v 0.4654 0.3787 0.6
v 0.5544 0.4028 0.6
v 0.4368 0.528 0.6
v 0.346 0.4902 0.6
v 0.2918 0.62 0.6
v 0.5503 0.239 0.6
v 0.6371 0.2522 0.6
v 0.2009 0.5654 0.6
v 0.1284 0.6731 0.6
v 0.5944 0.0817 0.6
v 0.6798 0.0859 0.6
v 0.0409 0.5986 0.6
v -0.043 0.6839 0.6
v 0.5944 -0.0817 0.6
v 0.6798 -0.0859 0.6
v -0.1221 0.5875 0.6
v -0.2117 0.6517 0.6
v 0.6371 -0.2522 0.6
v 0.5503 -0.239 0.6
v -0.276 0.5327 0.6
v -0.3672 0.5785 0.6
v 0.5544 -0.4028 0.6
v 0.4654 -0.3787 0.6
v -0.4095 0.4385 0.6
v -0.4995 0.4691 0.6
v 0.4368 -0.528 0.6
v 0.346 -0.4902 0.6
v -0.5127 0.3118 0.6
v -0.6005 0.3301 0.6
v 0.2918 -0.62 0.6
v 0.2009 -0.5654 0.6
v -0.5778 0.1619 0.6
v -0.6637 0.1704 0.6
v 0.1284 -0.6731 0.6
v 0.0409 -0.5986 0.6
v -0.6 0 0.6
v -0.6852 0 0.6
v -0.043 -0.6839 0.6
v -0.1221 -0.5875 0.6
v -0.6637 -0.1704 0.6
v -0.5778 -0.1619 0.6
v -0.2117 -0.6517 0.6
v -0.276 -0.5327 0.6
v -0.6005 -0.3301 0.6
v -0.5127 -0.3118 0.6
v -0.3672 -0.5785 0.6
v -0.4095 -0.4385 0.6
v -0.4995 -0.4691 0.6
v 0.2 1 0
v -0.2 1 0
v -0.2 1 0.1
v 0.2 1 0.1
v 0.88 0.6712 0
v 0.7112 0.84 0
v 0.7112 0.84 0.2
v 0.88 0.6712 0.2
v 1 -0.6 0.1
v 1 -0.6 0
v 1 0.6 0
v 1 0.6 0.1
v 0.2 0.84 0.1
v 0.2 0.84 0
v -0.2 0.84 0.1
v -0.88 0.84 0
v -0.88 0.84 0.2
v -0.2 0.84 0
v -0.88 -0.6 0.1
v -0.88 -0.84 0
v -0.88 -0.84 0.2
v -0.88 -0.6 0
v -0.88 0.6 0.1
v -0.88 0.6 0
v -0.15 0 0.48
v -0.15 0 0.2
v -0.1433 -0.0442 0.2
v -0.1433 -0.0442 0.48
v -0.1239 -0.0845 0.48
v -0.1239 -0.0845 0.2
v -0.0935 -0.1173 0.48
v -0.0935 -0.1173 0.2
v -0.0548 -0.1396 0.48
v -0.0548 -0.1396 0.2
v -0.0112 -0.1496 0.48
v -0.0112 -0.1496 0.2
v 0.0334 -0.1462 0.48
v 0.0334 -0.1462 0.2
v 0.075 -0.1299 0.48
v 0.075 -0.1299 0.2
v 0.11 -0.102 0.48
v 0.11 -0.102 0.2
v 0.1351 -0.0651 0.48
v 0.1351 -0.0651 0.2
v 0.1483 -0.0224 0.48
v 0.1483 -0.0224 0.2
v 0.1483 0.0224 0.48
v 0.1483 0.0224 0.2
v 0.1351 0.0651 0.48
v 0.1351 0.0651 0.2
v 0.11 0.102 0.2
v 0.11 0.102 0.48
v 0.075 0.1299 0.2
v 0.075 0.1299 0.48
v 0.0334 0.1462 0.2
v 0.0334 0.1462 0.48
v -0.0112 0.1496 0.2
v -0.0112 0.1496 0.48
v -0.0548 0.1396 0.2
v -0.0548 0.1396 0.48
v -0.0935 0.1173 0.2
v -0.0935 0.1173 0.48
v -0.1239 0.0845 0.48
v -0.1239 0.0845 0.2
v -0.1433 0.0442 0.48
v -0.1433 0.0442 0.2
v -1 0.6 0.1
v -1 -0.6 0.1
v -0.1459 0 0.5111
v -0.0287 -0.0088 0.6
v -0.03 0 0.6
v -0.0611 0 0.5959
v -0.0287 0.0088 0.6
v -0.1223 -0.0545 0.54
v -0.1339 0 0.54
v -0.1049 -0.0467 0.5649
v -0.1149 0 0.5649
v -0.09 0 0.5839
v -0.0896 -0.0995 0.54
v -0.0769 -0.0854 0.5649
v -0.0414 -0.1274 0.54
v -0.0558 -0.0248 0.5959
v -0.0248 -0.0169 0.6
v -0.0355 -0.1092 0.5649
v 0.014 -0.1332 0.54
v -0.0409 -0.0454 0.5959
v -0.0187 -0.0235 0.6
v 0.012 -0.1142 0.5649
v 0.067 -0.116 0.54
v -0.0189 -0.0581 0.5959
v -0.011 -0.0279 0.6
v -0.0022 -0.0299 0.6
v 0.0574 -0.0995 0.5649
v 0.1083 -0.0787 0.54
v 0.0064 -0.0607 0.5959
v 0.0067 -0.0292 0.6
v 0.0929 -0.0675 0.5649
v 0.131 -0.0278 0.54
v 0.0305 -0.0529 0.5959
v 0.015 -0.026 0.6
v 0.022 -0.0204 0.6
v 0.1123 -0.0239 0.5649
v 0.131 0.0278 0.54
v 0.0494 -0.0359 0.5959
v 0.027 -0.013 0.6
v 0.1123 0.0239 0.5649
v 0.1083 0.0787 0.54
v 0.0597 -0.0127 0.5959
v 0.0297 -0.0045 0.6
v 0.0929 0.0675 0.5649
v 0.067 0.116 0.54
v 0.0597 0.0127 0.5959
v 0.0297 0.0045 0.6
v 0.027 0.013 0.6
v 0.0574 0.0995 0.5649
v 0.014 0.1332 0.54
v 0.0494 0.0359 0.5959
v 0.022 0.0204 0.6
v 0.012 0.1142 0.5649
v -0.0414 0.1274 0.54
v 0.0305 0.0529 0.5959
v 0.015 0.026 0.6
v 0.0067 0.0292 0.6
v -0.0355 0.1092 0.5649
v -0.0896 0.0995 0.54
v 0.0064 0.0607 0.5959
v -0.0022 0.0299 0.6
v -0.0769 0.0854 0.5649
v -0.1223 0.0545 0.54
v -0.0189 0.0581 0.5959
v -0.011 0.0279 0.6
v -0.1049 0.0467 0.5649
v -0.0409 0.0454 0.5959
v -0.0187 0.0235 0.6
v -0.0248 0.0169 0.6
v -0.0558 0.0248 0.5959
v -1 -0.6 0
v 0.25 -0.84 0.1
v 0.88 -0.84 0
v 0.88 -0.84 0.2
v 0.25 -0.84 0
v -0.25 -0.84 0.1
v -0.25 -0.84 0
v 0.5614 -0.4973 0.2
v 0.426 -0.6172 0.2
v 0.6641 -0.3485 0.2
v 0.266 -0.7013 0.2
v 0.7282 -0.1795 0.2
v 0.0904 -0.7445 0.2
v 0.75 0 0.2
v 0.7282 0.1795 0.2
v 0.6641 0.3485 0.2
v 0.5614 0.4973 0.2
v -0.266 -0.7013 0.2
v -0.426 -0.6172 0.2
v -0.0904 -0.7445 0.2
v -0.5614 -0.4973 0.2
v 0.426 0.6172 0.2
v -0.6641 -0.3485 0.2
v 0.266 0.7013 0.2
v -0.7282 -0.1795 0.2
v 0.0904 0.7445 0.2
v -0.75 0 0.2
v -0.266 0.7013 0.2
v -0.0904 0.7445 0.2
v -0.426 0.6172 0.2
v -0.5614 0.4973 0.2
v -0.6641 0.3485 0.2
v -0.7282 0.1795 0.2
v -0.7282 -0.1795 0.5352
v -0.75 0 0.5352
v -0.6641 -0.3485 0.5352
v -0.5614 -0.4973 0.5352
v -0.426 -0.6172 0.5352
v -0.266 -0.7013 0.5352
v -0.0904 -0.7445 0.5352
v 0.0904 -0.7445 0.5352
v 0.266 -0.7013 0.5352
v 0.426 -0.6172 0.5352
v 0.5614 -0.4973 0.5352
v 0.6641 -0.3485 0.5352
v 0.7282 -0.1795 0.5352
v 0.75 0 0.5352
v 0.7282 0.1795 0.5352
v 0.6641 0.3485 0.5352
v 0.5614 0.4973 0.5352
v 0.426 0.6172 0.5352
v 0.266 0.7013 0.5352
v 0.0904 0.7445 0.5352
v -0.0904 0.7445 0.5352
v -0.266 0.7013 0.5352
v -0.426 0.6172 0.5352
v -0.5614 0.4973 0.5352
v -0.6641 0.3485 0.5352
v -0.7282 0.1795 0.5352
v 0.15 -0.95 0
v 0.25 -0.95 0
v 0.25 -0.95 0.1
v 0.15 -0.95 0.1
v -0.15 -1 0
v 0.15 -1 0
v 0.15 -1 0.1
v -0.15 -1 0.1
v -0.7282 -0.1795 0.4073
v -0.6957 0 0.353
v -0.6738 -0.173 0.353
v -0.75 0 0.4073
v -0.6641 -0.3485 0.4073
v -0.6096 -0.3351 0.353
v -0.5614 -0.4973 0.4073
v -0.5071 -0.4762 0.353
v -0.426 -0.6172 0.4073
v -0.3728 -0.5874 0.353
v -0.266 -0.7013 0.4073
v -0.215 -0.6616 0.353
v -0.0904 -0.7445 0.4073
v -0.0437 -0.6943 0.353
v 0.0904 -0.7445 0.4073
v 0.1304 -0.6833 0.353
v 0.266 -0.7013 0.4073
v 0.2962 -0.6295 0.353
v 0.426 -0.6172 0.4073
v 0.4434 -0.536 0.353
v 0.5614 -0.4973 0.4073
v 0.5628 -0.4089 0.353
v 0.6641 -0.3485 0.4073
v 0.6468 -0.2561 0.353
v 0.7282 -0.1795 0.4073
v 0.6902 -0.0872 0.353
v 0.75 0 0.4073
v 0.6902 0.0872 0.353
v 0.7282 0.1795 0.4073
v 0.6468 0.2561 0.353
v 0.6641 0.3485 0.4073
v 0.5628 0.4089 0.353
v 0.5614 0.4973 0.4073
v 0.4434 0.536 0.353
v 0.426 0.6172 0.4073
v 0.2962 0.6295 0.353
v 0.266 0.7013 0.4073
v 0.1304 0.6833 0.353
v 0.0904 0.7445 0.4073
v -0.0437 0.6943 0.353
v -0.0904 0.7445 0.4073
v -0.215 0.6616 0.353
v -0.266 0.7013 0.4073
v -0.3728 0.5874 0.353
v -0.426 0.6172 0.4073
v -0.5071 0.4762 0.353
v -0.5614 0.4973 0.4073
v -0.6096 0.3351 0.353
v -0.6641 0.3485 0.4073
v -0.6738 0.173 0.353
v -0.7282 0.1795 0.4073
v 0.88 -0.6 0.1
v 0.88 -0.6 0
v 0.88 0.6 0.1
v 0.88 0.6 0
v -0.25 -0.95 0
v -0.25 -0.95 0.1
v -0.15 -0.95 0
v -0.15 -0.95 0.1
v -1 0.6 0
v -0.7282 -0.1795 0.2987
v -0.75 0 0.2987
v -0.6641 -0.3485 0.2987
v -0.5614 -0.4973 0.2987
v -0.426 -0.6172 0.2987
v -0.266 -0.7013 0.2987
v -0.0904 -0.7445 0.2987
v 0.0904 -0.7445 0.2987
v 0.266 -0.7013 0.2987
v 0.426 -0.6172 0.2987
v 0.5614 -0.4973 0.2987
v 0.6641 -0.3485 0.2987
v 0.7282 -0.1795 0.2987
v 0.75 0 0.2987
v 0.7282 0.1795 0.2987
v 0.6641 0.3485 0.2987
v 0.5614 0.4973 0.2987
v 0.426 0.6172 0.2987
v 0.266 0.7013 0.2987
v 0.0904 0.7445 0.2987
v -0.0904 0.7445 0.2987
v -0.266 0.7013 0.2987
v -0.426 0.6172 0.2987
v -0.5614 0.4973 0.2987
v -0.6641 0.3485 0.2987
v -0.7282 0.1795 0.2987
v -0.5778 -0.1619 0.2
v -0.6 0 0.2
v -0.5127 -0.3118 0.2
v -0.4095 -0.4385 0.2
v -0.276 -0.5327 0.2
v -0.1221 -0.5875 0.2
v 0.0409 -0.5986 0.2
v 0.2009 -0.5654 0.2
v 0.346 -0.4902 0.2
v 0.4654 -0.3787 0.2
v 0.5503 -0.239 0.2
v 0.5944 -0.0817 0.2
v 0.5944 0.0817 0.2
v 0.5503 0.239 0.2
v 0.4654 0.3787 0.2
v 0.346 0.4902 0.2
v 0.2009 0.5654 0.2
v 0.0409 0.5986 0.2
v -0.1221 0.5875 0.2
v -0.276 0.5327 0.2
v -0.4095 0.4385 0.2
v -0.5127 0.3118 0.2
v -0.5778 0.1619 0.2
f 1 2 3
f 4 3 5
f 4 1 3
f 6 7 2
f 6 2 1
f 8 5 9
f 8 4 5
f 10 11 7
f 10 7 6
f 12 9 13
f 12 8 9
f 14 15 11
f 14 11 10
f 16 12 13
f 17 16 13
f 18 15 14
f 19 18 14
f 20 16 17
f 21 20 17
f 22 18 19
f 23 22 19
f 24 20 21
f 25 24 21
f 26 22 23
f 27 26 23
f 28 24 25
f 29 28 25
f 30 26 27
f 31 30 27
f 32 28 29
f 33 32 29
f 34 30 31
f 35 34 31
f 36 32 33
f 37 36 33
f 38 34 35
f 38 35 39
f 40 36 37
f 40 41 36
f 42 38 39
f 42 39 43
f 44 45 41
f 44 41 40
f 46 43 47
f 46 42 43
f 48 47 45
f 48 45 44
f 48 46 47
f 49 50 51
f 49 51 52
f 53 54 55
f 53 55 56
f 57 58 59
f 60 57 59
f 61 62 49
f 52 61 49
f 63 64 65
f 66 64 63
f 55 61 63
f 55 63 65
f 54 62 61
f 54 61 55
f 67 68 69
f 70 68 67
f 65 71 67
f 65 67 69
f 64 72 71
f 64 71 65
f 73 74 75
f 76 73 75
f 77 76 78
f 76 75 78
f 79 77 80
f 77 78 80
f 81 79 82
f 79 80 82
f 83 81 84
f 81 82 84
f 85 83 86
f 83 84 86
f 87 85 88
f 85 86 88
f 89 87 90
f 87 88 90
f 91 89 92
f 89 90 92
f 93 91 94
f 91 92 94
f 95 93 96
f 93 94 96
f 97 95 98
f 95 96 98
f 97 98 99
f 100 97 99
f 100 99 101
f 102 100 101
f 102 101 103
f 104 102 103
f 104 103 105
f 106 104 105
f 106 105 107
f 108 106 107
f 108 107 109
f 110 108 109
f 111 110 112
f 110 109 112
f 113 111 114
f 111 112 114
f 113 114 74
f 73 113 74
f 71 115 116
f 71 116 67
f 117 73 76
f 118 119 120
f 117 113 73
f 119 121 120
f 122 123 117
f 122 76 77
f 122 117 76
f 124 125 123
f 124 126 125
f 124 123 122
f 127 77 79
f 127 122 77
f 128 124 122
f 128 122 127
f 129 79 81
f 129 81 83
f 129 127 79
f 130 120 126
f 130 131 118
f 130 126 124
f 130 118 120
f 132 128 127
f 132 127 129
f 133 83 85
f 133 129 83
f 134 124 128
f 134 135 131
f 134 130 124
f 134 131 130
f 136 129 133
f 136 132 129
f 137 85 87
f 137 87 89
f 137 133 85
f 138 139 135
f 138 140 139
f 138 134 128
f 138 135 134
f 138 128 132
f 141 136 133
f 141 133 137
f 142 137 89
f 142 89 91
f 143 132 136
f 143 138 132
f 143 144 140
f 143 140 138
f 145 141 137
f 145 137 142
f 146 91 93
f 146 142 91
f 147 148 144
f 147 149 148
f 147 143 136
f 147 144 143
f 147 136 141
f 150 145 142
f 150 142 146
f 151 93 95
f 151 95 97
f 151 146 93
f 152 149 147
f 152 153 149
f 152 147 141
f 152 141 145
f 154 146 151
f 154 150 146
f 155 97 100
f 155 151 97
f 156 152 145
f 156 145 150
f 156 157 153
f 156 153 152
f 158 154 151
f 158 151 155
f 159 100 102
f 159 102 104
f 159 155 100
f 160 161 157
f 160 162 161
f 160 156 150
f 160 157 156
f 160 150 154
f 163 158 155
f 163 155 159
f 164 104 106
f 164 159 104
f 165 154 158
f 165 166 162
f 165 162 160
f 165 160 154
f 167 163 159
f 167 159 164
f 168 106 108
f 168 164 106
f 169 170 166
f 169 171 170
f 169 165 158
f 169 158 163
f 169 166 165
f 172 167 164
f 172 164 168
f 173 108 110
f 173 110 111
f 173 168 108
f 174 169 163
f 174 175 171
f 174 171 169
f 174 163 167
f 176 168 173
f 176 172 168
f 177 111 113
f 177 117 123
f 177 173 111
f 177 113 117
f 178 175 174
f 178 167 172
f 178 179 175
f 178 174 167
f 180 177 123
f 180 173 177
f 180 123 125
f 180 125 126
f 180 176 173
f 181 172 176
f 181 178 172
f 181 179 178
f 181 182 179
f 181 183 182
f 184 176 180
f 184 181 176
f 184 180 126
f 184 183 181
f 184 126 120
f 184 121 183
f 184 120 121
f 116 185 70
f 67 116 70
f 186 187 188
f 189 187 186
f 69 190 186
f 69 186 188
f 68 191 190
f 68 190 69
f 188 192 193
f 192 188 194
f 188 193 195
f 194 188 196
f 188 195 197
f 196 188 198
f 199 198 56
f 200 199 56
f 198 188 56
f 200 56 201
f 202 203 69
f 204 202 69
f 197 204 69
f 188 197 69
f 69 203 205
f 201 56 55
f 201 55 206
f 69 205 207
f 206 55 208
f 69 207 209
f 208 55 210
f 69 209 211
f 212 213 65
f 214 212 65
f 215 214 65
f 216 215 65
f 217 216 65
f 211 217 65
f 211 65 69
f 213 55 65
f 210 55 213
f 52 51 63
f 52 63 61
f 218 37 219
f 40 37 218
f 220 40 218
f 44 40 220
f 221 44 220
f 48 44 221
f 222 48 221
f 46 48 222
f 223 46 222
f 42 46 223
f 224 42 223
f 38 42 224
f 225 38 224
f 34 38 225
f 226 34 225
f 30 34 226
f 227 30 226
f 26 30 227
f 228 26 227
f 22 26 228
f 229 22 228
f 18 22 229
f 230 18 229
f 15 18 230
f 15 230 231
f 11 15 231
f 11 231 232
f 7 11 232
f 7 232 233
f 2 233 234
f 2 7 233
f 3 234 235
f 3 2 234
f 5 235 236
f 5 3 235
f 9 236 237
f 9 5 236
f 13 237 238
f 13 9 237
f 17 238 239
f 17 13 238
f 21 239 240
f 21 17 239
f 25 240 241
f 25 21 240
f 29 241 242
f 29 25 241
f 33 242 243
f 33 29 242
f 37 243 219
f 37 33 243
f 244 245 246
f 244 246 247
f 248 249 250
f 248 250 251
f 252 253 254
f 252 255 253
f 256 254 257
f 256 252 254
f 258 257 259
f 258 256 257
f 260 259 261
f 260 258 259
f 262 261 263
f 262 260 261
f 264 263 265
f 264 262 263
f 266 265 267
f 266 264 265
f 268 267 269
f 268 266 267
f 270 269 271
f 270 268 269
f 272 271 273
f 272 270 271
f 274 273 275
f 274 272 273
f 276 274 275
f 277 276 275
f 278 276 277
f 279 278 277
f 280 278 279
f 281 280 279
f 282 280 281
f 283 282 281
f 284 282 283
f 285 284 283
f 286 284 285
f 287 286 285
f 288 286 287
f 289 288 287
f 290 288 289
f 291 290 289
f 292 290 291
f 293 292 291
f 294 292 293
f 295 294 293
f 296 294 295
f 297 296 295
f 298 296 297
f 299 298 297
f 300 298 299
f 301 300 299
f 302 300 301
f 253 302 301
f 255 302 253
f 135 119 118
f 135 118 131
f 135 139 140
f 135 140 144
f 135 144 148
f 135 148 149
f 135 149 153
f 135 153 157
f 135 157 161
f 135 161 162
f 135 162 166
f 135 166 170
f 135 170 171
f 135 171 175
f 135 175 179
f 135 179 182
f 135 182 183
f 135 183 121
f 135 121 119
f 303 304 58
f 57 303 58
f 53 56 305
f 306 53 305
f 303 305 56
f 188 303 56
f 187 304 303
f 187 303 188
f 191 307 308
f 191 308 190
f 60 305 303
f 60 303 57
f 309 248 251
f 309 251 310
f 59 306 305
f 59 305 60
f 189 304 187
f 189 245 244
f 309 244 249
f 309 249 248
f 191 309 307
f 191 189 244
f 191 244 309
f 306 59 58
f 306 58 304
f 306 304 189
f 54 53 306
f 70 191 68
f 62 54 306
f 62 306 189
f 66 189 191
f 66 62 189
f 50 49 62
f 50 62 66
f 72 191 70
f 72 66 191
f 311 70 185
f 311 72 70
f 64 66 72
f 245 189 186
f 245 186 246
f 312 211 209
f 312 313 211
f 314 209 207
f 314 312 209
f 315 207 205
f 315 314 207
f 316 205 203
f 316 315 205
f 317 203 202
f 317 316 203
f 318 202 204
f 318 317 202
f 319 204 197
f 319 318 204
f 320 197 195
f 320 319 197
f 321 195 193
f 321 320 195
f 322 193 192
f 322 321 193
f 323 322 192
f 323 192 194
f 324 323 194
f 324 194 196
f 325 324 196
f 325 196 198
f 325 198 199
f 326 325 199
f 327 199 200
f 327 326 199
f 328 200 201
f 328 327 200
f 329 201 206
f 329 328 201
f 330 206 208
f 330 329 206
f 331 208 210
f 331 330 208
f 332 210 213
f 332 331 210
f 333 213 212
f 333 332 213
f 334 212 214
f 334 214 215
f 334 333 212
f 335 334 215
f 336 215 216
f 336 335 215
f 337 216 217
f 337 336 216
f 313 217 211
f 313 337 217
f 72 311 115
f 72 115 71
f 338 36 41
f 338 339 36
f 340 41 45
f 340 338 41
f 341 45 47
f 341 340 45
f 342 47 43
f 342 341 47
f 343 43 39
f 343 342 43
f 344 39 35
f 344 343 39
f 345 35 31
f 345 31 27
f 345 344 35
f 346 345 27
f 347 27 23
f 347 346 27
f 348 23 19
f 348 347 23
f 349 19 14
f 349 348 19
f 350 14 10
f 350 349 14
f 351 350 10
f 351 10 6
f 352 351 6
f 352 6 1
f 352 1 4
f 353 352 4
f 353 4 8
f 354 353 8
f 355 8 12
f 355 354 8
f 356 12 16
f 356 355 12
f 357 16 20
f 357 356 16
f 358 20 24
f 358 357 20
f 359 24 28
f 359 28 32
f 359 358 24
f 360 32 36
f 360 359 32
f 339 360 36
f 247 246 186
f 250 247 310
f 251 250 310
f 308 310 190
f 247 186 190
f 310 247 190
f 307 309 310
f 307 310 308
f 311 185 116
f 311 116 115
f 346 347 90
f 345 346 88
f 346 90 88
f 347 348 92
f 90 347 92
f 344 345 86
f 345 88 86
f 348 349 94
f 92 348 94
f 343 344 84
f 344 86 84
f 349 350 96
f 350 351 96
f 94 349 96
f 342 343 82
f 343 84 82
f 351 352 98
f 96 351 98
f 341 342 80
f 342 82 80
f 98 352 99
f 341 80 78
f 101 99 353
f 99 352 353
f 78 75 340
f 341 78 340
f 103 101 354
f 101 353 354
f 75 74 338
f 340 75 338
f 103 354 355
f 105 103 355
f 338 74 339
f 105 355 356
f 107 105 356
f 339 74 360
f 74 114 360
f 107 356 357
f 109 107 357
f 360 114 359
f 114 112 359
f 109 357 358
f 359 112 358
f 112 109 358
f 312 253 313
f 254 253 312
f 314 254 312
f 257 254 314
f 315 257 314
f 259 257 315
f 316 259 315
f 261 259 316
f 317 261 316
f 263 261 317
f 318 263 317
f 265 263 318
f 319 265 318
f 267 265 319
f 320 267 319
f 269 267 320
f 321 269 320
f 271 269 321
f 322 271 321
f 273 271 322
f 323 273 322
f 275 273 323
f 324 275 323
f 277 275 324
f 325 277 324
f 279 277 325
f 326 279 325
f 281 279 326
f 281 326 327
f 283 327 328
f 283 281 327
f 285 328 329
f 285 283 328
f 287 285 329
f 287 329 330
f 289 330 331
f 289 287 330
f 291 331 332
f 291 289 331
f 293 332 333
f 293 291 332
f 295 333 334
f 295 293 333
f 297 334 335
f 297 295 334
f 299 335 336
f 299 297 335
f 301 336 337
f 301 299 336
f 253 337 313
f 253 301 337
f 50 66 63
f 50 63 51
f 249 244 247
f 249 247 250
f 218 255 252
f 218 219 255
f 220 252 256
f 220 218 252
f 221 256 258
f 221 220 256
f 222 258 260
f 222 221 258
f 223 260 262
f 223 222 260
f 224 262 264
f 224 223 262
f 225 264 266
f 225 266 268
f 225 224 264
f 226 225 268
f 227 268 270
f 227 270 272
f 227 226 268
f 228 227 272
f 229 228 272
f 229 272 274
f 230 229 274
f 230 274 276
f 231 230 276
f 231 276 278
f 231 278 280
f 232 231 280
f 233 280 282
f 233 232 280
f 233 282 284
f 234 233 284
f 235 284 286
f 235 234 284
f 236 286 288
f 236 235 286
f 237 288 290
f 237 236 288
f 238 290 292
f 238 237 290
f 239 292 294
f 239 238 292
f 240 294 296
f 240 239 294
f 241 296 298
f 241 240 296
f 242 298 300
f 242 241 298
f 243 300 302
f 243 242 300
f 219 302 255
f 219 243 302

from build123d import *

# Parameters (mm, degrees)
BOSS_EXTRUDE1_DEPTH = 0.2
SKETCH3_R           = 0.15
BOSS_EXTRUDE2_DEPTH = 0.4
FILLET1_R           = 0.12
SKETCH4_W           = 0.4
SKETCH4_H           = 0.16
SKETCH4_W_2         = 0.12
SKETCH4_H_2         = 1.2
BOSS_EXTRUDE3_DEPTH = 0.1


with BuildPart() as part:
    # Sketch1 → Boss-Extrude1 (new body)
    with BuildSketch(Plane.XY):
        Polygon((0.711160981, 0.84), (0.88, 0.671160981), (0.88, -0.84), (-0.88, -0.84), (-0.88, 0.84), align=None)
    extrude(amount=BOSS_EXTRUDE1_DEPTH)

    # Sketch2 → Revolve1 (revolve)
    with BuildSketch(Plane(origin=(0, 0, 0), x_dir=(1, 0, 0), z_dir=(0, 1, 0)), mode=Mode.PRIVATE) as revolve1_sk:
        Polygon((0.75, -0.2), (0.75, -0.298667135), (0.695670226, -0.35299691), (0.75, -0.407326684), (0.75, -0.535218952), (0.685218952, -0.6), (0.6, -0.6), (0.6, -0.2), align=None)
    revolve(revolve1_sk.sketch.rotate(Axis((0, 0, -0.03), (0, 0, 1)), 180), axis=Axis((0, 0, -0.03), (0, 0, 1)))

    # Sketch3 → Boss-Extrude2 (add)
    with BuildSketch(Plane.XY.offset(0.2)):
        with Locations(Location((0, 0, 0), (0, 0, 180))):
            Circle(SKETCH3_R)
    extrude(amount=BOSS_EXTRUDE2_DEPTH)

    # Fillet1
    fillet1_edges = [part.edges().sort_by_distance(p)[0] for p in [
        (0.15, 0, 0.6),
    ]]
    fillet(fillet1_edges, radius=FILLET1_R)

    # Sketch4 → Boss-Extrude3 (add)
    with BuildSketch(Plane.XY):
        with Locations((0, 0.92)):
            Rectangle(SKETCH4_W, SKETCH4_H)
        Polygon((-0.25, -0.84), (0.25, -0.84), (0.25, -0.95), (0.15, -0.95), (0.15, -1), (-0.15, -1), (-0.15, -0.95), (-0.25, -0.95), align=None)
        with Locations((-0.94, 0)):
            Rectangle(SKETCH4_W_2, SKETCH4_H_2)
        with Locations((0.94, 0)):
            Rectangle(SKETCH4_W_2, SKETCH4_H_2)
    extrude(amount=BOSS_EXTRUDE3_DEPTH)


solid = part.part
